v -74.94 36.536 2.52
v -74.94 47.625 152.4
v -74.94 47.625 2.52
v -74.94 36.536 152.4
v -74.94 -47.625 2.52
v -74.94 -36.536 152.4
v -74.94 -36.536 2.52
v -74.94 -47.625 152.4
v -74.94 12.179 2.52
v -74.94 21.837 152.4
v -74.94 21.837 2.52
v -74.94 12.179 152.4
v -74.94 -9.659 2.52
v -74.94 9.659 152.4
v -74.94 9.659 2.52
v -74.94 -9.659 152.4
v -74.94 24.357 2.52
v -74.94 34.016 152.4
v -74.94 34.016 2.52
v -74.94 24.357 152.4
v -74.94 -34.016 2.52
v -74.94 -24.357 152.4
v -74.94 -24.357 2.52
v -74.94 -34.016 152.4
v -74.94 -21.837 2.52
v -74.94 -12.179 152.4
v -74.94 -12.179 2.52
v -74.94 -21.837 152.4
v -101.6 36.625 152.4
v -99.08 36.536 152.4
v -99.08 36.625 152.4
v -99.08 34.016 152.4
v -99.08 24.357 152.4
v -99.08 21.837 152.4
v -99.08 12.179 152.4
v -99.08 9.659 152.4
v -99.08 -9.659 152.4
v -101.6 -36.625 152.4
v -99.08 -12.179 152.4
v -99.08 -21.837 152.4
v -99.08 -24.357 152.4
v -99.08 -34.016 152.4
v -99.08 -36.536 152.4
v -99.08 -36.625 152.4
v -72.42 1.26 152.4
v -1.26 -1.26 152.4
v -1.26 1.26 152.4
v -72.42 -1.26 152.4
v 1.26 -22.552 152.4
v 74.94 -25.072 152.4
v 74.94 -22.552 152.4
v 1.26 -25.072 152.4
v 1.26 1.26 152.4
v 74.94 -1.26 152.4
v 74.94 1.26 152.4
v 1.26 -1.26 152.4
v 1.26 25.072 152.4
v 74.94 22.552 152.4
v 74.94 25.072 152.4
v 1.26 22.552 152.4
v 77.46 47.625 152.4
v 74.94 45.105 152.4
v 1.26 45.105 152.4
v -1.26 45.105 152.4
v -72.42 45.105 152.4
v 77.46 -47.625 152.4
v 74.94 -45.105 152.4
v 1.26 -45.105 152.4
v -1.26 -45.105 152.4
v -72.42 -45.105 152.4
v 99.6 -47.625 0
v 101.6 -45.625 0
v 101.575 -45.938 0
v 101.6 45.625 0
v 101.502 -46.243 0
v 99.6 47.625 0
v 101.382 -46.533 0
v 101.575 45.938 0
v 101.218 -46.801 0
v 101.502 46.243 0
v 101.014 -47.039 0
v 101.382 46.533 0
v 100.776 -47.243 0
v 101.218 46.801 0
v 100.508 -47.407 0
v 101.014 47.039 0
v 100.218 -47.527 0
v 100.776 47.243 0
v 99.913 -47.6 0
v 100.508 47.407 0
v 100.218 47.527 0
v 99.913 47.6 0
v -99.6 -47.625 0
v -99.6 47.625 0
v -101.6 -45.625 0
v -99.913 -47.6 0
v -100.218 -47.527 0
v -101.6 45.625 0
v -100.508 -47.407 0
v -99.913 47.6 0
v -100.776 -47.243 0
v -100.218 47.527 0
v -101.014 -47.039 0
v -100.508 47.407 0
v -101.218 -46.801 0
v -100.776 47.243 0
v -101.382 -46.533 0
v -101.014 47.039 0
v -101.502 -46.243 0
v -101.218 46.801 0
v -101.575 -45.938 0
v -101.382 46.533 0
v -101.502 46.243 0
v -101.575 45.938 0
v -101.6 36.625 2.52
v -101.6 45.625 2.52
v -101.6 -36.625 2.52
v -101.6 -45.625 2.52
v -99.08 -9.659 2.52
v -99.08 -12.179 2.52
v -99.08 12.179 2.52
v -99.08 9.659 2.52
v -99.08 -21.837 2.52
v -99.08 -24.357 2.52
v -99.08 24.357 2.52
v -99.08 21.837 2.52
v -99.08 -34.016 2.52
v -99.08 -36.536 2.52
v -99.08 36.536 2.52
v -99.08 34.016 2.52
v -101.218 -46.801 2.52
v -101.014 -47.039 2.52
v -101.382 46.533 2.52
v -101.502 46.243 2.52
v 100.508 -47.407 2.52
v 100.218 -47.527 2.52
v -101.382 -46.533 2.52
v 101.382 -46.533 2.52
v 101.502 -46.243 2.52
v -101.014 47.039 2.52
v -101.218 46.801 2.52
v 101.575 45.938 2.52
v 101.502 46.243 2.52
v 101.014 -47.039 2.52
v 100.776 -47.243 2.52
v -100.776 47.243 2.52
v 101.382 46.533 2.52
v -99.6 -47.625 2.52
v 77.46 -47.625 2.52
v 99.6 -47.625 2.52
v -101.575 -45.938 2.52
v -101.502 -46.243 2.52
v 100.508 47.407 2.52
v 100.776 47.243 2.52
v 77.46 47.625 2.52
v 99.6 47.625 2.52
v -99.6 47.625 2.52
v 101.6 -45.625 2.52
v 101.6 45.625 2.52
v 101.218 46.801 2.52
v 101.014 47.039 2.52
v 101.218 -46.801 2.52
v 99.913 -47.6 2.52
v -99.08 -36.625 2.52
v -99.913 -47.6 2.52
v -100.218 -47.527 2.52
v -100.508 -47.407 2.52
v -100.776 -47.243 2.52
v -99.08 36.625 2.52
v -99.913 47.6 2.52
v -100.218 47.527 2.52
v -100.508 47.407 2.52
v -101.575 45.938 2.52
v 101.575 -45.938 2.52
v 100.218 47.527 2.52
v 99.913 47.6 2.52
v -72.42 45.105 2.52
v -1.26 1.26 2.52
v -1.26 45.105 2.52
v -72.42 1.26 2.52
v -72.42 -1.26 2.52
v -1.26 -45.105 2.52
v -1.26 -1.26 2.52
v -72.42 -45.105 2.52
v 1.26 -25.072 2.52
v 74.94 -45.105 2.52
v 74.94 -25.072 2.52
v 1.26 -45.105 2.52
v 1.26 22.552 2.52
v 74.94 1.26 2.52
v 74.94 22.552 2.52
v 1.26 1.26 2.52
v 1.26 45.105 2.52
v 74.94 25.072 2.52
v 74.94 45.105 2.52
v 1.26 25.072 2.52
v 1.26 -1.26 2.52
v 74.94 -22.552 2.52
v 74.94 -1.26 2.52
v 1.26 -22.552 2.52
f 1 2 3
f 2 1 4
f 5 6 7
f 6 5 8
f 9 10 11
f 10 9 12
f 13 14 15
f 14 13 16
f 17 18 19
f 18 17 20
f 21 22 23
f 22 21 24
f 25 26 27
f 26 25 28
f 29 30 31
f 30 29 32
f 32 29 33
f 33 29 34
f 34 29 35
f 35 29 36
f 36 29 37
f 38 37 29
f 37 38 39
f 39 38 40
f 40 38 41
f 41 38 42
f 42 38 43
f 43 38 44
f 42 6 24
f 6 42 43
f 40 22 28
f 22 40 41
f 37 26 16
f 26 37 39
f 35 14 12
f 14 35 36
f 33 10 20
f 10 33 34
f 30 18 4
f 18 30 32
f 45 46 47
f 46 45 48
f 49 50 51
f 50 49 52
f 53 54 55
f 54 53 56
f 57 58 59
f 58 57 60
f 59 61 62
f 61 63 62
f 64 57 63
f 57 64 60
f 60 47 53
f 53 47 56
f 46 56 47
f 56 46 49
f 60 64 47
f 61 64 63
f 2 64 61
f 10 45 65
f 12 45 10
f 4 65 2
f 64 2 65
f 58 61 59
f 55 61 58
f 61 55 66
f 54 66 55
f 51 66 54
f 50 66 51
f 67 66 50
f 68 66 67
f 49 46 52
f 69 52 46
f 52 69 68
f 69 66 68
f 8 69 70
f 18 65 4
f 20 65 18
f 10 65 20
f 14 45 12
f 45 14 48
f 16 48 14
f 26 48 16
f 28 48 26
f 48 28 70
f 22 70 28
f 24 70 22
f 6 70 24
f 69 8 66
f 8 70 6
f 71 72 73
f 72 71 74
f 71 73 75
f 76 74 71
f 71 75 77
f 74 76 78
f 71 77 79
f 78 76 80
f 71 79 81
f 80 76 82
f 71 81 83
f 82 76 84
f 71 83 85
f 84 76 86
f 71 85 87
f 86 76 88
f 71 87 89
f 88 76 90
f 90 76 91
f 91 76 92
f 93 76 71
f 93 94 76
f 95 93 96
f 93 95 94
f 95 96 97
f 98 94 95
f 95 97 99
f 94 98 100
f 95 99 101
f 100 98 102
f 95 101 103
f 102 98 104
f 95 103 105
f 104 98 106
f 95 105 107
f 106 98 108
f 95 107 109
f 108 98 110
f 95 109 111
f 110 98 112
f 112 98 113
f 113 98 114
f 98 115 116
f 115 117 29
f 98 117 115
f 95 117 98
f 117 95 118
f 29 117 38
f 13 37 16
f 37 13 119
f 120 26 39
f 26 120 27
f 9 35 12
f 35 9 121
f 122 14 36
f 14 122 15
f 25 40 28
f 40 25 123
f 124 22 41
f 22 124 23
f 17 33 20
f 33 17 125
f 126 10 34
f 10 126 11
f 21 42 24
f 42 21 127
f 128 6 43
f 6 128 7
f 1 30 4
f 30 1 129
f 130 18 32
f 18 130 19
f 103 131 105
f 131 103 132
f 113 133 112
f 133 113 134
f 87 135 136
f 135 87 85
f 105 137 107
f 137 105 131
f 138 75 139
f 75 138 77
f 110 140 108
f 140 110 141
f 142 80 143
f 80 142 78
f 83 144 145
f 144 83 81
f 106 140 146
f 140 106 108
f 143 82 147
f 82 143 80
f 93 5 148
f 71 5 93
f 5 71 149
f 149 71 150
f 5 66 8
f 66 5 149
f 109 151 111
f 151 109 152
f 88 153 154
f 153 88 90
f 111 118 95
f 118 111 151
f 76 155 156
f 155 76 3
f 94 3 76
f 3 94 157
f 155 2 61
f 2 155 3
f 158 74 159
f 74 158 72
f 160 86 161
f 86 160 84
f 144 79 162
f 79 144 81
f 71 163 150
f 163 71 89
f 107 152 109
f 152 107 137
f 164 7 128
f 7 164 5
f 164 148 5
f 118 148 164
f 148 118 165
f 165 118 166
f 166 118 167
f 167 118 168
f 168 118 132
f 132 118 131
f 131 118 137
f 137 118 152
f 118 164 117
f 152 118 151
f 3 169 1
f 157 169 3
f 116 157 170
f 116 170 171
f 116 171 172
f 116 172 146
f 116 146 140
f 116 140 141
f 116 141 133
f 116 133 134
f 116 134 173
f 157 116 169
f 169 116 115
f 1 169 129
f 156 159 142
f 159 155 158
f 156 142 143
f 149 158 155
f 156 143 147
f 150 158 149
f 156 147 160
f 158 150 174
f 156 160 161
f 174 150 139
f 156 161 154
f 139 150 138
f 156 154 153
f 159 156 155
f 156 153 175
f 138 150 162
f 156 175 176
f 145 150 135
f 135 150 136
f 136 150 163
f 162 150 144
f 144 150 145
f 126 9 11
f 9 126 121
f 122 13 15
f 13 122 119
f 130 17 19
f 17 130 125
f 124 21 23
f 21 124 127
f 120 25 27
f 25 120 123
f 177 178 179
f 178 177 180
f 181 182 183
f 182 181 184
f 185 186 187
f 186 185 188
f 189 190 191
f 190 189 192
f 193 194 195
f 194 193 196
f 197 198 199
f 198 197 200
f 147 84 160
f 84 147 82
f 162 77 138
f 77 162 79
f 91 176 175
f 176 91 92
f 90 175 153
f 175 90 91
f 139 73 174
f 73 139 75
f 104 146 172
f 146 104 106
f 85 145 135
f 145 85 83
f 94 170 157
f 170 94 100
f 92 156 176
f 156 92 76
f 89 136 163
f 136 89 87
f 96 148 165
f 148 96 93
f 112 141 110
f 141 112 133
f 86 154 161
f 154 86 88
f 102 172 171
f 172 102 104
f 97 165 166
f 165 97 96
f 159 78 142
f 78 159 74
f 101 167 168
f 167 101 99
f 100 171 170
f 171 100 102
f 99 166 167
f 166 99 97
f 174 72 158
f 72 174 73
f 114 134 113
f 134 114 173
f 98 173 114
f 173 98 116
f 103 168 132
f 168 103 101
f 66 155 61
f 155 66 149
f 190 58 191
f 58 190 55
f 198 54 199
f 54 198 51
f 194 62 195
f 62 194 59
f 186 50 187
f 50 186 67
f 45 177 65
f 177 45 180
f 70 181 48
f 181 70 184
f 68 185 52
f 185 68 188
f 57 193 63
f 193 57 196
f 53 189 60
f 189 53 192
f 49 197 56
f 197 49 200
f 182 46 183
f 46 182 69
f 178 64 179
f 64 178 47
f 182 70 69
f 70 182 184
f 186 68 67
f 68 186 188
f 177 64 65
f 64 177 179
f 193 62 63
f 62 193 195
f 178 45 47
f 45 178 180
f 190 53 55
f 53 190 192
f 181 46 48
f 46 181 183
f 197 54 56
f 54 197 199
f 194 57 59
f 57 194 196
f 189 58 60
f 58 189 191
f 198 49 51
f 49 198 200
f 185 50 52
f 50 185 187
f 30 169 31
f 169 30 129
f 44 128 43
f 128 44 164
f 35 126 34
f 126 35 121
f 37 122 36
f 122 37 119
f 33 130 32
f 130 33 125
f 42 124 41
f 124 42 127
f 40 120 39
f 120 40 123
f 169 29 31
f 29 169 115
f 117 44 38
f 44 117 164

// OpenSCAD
wid=101.6*2;
dep=95.25;
ht =152.4;
thk=2.52;

$fn=40;

linear_extrude(height=thk) hull() {
   translate([-wid/2+2,-dep/2+2,0]) circle(d=4);
   translate([wid/2-2,-dep/2+2,0]) circle(d=4);
   translate([-wid/2+2,dep/2-2,0]) circle(d=4);
   translate([wid/2-2,dep/2-2,0]) circle(d=4);
}

translate([wid/2-25.4-thk/2,-dep/2,0]) cube([2.52,dep,ht]);
translate([-wid/2+25.4+thk/2,-dep/2,0]) cube([2.52,dep,ht]);
translate([-thk/2,-dep/2,0]) cube([2.52,dep,ht]);

translate([-wid/2+25.4+thk/2,-dep/2,0]) cube([wid-2*25.4,thk,ht]);
translate([-wid/2+25.4+thk/2,dep/2-thk,0]) cube([wid-2*25.4,thk,ht]);
translate([-wid/2+25.4+thk/2,-thk/2,0]) cube([wid-2*25.4,thk,ht]);

translate([0,dep/4-thk/2,0]) cube([wid/2-25.4,thk,ht]);
translate([0,-dep/4-thk/2,0]) cube([wid/2-25.4,thk,ht]);

for (i=[1:3]) {
   translate([-wid/2,-(dep-10)/7 * i,0]) cube([25.4+thk/2,2.52,ht]);
   translate([-wid/2,+(dep-10)/7 * i-thk,0]) cube([25.4+thk/2,2.52,ht]);
}

translate([-wid/2,-dep/2+11,0]) cube([2.52,dep-22,ht]);
